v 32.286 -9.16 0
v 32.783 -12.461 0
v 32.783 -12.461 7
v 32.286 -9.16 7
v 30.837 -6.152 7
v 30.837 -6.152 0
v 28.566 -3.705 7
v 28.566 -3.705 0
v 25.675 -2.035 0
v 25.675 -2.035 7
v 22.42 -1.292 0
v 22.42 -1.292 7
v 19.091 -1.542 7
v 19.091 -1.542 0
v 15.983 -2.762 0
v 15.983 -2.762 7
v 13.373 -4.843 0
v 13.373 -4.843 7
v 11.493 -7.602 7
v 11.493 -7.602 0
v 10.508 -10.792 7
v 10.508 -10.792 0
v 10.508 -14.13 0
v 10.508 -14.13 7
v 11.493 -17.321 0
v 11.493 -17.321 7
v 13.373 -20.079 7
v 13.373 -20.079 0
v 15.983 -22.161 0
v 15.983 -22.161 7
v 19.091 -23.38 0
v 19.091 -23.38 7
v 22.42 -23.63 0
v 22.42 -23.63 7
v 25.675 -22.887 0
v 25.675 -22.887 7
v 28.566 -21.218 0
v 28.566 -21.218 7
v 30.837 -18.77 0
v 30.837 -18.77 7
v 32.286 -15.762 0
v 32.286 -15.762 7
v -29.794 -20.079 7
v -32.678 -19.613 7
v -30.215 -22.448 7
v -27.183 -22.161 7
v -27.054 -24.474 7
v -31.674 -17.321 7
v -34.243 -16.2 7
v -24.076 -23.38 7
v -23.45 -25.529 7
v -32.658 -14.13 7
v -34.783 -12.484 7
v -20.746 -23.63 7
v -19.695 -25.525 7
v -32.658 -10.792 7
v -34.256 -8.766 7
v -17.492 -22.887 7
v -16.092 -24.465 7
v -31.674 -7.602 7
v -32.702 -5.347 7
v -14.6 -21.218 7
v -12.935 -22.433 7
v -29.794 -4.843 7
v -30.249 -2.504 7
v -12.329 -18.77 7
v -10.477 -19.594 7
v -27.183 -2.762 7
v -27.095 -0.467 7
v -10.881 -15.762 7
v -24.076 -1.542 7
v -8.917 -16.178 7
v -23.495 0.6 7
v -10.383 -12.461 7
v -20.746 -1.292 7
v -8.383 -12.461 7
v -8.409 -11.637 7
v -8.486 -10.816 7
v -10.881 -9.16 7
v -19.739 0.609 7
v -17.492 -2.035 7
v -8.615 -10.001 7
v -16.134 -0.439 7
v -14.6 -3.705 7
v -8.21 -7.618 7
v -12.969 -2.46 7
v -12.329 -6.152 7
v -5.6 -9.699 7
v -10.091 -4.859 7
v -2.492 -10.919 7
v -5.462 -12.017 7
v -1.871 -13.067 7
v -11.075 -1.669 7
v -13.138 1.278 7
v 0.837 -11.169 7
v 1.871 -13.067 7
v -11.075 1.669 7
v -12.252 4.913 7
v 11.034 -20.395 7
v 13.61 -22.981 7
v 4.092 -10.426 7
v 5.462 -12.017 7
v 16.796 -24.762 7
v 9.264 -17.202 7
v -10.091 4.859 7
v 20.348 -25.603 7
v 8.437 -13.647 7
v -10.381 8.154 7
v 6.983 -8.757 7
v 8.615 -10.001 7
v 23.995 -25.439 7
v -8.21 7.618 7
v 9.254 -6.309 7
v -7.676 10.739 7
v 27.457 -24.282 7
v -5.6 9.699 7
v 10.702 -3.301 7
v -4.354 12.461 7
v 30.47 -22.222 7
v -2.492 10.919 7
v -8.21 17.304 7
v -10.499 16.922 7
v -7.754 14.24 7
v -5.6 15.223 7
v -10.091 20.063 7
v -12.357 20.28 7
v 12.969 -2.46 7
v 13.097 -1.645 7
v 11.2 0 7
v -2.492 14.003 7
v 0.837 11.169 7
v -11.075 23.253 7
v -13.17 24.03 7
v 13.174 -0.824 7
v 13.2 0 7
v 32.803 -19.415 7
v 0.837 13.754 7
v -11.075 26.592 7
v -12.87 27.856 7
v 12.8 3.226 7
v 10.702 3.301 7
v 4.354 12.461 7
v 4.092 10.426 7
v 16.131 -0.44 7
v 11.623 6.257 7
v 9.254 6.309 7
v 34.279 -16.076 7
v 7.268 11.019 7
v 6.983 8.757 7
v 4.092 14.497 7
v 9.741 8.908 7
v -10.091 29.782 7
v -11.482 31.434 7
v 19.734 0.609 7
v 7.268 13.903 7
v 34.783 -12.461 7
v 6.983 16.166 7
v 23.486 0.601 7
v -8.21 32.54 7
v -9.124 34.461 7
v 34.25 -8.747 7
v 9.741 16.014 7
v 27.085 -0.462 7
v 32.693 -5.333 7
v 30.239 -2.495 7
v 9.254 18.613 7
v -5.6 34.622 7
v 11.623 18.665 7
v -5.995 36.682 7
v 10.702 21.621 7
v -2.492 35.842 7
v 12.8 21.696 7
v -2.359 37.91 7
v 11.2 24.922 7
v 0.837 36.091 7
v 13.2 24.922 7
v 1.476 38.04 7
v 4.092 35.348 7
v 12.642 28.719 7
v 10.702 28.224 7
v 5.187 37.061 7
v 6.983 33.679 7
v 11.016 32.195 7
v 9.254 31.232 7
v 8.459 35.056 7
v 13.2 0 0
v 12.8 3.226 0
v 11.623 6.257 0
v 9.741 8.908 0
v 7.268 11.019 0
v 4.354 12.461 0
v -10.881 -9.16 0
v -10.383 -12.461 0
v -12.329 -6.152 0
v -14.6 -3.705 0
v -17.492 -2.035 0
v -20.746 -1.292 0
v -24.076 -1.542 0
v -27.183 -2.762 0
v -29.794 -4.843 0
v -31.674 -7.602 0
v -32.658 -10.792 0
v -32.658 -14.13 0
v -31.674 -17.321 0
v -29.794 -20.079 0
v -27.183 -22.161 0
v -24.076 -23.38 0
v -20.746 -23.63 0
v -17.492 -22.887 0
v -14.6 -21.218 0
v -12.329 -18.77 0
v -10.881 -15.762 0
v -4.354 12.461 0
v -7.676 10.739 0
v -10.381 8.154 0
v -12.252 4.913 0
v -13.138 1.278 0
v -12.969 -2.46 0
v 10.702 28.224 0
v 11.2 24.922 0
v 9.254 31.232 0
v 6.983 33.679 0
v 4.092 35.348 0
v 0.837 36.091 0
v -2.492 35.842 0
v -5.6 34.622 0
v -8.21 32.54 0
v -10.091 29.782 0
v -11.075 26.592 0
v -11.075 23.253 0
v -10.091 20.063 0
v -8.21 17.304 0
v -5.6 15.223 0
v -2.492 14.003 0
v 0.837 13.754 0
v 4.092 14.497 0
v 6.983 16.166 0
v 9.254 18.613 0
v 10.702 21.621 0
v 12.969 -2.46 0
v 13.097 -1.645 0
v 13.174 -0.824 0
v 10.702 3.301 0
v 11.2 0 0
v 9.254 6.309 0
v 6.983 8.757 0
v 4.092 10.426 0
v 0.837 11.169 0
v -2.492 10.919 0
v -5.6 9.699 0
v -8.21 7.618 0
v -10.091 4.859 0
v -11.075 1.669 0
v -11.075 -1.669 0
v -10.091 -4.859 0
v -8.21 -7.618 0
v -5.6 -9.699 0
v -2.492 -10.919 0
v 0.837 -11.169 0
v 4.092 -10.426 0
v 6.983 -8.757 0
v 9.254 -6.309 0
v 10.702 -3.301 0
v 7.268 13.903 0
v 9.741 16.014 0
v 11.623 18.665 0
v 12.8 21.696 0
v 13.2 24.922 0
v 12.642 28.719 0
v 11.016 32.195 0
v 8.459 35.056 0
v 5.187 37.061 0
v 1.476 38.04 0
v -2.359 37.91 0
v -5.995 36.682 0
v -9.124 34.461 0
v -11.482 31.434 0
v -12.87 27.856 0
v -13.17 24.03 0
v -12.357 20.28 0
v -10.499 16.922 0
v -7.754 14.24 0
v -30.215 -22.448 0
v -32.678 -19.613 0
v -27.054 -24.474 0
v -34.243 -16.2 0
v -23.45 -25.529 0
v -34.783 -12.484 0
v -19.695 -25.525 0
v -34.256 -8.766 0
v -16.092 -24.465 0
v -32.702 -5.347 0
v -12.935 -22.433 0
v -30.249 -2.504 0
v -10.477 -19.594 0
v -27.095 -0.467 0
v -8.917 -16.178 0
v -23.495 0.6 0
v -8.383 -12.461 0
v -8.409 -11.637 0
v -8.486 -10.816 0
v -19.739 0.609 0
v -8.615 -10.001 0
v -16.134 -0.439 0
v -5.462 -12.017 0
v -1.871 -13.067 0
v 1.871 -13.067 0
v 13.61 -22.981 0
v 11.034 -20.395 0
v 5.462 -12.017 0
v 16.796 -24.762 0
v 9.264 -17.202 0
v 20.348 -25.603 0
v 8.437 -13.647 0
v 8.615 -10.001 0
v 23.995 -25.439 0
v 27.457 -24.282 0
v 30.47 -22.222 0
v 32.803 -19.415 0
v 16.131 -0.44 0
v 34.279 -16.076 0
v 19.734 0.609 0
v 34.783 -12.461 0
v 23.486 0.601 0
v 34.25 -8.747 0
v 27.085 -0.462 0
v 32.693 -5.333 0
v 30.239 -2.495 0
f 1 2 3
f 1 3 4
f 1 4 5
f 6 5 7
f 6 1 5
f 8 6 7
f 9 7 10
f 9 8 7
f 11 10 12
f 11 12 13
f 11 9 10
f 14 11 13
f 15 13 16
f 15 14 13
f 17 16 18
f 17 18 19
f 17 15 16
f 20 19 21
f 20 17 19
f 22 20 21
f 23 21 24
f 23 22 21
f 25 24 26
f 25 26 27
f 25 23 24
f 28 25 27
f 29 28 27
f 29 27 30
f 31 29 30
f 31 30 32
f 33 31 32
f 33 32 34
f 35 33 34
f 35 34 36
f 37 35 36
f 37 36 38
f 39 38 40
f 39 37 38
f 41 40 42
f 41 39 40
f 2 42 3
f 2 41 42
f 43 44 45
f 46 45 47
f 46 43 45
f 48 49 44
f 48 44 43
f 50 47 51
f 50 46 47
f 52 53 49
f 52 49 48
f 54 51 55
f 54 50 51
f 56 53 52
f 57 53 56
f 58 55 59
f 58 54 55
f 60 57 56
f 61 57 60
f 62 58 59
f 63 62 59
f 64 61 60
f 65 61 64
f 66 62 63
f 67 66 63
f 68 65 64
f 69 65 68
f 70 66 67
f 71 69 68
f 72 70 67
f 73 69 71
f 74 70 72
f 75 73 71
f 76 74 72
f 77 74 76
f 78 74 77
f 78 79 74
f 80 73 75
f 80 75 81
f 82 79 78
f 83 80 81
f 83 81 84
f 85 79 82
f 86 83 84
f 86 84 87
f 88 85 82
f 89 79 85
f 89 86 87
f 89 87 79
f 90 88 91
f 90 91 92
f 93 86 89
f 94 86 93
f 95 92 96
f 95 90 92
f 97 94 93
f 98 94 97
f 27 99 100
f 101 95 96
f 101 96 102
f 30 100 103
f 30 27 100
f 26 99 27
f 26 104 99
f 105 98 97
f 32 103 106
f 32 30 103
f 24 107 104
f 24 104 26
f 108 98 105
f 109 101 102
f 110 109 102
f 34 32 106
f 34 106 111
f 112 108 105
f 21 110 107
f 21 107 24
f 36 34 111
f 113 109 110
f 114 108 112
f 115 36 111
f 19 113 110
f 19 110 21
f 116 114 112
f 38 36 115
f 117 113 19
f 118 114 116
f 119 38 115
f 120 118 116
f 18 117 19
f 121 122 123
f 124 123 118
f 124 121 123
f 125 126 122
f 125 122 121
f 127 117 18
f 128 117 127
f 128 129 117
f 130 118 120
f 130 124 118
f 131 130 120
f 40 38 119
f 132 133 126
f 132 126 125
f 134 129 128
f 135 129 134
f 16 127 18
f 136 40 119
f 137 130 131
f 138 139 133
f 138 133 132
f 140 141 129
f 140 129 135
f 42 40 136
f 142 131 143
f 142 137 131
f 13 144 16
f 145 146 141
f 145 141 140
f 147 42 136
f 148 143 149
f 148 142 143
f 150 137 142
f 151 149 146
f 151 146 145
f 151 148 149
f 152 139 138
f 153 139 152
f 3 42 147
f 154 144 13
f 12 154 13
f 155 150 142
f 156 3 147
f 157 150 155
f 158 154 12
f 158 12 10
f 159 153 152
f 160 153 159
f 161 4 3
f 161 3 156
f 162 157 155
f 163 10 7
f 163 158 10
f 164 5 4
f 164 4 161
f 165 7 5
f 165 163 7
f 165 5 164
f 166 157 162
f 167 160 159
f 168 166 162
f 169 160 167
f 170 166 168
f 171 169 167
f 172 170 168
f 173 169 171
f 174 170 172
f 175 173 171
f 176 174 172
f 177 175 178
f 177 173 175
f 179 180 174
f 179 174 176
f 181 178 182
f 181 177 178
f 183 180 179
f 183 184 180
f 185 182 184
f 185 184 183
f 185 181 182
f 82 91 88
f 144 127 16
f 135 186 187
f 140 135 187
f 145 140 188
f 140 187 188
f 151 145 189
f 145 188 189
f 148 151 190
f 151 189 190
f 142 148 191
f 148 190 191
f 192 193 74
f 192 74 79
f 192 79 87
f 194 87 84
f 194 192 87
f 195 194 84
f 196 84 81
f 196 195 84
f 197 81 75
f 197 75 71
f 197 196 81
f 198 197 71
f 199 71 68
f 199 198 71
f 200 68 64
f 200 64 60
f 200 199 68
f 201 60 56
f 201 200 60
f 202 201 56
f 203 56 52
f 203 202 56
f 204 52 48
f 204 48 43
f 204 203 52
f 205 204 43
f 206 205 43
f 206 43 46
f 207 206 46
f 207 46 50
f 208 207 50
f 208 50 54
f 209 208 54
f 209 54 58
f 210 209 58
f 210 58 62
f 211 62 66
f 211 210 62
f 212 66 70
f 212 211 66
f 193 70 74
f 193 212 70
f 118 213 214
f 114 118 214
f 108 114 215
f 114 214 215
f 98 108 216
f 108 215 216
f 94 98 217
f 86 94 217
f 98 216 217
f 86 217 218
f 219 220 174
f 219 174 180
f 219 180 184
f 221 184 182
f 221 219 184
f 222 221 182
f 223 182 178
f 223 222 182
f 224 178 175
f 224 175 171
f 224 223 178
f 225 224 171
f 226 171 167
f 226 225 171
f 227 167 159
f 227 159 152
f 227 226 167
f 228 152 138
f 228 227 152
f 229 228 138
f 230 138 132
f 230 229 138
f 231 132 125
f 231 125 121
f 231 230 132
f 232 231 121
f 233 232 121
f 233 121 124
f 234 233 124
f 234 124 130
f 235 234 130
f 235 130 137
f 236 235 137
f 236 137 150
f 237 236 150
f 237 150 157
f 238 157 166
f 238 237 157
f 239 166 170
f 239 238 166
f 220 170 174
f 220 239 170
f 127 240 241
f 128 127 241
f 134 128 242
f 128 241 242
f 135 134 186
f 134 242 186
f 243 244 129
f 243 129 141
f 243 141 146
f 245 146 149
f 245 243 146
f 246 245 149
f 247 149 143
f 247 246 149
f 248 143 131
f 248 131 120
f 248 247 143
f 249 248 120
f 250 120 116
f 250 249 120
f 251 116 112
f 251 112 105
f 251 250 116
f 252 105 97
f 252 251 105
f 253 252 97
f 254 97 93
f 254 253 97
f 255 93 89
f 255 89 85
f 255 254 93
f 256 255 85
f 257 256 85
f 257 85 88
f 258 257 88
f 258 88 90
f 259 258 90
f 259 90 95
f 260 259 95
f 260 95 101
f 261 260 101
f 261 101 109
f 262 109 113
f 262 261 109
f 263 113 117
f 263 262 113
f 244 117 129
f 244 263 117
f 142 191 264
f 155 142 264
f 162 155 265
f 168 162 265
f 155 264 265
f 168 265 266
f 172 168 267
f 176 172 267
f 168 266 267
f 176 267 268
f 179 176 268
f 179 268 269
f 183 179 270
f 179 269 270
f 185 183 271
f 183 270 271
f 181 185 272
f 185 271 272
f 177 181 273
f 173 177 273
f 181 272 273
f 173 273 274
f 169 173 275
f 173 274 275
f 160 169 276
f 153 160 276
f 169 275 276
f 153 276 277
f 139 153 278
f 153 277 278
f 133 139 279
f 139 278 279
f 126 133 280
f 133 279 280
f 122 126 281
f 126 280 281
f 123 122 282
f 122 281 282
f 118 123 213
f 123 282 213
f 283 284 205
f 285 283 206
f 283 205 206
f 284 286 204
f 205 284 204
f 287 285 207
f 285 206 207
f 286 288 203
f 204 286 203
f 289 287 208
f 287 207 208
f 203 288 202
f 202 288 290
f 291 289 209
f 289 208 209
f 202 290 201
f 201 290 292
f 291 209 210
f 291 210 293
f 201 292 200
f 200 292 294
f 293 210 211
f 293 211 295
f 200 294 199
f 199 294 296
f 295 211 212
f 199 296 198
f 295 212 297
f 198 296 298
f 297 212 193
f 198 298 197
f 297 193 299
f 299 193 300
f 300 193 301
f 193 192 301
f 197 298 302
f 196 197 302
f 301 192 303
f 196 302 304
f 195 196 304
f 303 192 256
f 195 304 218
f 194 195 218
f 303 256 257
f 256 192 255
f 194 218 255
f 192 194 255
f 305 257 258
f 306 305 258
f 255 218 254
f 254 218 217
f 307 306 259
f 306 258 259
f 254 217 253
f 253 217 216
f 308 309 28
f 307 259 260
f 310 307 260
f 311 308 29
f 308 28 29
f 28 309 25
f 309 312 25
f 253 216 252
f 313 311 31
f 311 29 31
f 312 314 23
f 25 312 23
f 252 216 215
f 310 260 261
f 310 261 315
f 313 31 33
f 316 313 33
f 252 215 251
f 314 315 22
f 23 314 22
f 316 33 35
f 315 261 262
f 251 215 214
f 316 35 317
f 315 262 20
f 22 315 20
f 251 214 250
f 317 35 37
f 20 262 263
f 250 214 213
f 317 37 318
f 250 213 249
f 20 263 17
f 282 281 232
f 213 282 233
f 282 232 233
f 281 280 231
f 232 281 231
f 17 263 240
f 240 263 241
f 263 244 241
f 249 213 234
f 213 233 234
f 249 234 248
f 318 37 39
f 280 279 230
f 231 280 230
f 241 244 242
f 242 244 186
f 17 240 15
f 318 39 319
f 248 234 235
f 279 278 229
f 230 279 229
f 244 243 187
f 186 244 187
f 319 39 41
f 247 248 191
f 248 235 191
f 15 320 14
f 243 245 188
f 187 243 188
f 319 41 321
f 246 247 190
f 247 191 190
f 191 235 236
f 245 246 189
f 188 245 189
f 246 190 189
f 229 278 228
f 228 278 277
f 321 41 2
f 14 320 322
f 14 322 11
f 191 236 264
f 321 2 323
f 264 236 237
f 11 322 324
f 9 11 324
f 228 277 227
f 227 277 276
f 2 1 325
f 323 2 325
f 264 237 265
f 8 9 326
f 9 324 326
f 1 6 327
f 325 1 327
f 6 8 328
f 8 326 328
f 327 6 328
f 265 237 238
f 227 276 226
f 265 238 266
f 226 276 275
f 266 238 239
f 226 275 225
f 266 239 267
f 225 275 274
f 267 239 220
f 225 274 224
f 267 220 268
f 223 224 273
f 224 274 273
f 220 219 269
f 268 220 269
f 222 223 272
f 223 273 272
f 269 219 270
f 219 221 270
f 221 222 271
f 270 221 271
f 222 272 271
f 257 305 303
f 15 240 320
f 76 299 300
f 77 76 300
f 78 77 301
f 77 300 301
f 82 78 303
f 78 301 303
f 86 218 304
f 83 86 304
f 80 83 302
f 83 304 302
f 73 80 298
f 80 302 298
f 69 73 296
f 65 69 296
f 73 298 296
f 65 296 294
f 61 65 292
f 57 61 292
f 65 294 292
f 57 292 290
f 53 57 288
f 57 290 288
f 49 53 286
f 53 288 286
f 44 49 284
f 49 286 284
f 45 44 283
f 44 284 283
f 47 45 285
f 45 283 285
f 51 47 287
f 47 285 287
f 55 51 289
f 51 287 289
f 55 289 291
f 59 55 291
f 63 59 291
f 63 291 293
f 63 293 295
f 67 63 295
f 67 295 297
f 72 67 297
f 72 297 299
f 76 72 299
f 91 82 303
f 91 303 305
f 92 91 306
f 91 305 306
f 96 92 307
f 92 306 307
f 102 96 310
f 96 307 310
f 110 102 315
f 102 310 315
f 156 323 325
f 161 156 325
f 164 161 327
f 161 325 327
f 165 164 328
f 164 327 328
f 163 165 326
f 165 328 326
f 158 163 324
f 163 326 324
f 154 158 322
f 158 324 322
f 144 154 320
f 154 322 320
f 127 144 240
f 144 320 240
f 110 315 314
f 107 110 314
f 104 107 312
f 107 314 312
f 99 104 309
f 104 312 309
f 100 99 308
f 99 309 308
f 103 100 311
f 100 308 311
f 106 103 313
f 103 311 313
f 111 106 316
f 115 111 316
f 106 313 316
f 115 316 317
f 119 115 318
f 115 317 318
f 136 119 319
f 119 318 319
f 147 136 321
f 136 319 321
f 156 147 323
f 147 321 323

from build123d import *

# Parameters (mm, degrees)
F0_R     = 11.2
F1_DEPTH = 7


with BuildPart() as f1:
    # F0 (on Top) → F1 (new body)
    with BuildSketch(Plane.XY):
        with BuildLine():
            ThreePointArc((12.968803749, -2.4597010632), (13.1420738372, -1.2352713292), (13.2, 0))
            ThreePointArc((13.2, 0), (10.7637341369, 7.6408132702), (4.3542382681, 12.4611640349))
            ThreePointArc((4.3542382681, 12.4611640349), (0, 11.7223280698), (-4.3542382681, 12.4611640349))
            ThreePointArc((-4.3542382681, 12.4611640349), (-11.43153533, 6.6), (-12.968803749, -2.4597010632))
            ThreePointArc((-12.968803749, -2.4597010632), (-10.1518338999, -5.8611640349), (-8.6145654809, -10.0014629717))
            ThreePointArc((-8.6145654809, -10.0014629717), (0, -13.2), (8.6145654809, -10.0014629717))
            ThreePointArc((8.6145654809, -10.0014629717), (10.1518338999, -5.8611640349), (12.968803749, -2.4597010632))
        make_face()
        Circle(F0_R, mode=Mode.SUBTRACT)
        with BuildLine():
            ThreePointArc((-4.3542382681, 12.4611640349), (0, 11.7223280698), (4.3542382681, 12.4611640349))
            ThreePointArc((4.3542382681, 12.4611640349), (0, 13.2), (-4.3542382681, 12.4611640349))
        make_face()
        with BuildLine():
            ThreePointArc((-4.3542382681, 12.4611640349), (0, 13.2), (4.3542382681, 12.4611640349))
            ThreePointArc((4.3542382681, 12.4611640349), (10.7637341369, 17.2815147996), (13.2, 24.9223280698))
            ThreePointArc((13.2, 24.9223280698), (-7.6408132702, 35.6860622067), (-4.3542382681, 12.4611640349))
        make_face()
        with Locations((0, 24.9223280698)):
            Circle(F0_R, mode=Mode.SUBTRACT)
        with BuildLine():
            ThreePointArc((34.7833692299, -12.4611640349), (27.0846297969, -0.4621585689), (12.968803749, -2.4597010632))
            ThreePointArc((12.968803749, -2.4597010632), (11.43153533, -6.6), (8.6145654809, -10.0014629717))
            ThreePointArc((8.6145654809, -10.0014629717), (20.3480979007, -25.6032378721), (34.7833692299, -12.4611640349))
        make_face()
        with Locations((21.5833692299, -12.4611640349)):
            Circle(F0_R, mode=Mode.SUBTRACT)
        with BuildLine():
            ThreePointArc((8.6145654809, -10.0014629717), (11.43153533, -6.6), (12.968803749, -2.4597010632))
            ThreePointArc((12.968803749, -2.4597010632), (10.1518338999, -5.8611640349), (8.6145654809, -10.0014629717))
        make_face()
        with BuildLine():
            ThreePointArc((-8.6145654809, -10.0014629717), (-10.1518338999, -5.8611640349), (-12.968803749, -2.4597010632))
            ThreePointArc((-12.968803749, -2.4597010632), (-11.43153533, -6.6), (-8.6145654809, -10.0014629717))
        make_face()
        with BuildLine():
            ThreePointArc((-8.6145654809, -10.0014629717), (-11.43153533, -6.6), (-12.968803749, -2.4597010632))
            ThreePointArc((-12.968803749, -2.4597010632), (-33.5823746959, -17.9624246019), (-8.3833692299, -12.4611640349))
            ThreePointArc((-8.3833692299, -12.4611640349), (-8.4412953927, -11.2258927057), (-8.6145654809, -10.0014629717))
        make_face()
        with Locations((-21.5833692299, -12.4611640349)):
            Circle(F0_R, mode=Mode.SUBTRACT)
    extrude(amount=F1_DEPTH)


solid = f1.part
